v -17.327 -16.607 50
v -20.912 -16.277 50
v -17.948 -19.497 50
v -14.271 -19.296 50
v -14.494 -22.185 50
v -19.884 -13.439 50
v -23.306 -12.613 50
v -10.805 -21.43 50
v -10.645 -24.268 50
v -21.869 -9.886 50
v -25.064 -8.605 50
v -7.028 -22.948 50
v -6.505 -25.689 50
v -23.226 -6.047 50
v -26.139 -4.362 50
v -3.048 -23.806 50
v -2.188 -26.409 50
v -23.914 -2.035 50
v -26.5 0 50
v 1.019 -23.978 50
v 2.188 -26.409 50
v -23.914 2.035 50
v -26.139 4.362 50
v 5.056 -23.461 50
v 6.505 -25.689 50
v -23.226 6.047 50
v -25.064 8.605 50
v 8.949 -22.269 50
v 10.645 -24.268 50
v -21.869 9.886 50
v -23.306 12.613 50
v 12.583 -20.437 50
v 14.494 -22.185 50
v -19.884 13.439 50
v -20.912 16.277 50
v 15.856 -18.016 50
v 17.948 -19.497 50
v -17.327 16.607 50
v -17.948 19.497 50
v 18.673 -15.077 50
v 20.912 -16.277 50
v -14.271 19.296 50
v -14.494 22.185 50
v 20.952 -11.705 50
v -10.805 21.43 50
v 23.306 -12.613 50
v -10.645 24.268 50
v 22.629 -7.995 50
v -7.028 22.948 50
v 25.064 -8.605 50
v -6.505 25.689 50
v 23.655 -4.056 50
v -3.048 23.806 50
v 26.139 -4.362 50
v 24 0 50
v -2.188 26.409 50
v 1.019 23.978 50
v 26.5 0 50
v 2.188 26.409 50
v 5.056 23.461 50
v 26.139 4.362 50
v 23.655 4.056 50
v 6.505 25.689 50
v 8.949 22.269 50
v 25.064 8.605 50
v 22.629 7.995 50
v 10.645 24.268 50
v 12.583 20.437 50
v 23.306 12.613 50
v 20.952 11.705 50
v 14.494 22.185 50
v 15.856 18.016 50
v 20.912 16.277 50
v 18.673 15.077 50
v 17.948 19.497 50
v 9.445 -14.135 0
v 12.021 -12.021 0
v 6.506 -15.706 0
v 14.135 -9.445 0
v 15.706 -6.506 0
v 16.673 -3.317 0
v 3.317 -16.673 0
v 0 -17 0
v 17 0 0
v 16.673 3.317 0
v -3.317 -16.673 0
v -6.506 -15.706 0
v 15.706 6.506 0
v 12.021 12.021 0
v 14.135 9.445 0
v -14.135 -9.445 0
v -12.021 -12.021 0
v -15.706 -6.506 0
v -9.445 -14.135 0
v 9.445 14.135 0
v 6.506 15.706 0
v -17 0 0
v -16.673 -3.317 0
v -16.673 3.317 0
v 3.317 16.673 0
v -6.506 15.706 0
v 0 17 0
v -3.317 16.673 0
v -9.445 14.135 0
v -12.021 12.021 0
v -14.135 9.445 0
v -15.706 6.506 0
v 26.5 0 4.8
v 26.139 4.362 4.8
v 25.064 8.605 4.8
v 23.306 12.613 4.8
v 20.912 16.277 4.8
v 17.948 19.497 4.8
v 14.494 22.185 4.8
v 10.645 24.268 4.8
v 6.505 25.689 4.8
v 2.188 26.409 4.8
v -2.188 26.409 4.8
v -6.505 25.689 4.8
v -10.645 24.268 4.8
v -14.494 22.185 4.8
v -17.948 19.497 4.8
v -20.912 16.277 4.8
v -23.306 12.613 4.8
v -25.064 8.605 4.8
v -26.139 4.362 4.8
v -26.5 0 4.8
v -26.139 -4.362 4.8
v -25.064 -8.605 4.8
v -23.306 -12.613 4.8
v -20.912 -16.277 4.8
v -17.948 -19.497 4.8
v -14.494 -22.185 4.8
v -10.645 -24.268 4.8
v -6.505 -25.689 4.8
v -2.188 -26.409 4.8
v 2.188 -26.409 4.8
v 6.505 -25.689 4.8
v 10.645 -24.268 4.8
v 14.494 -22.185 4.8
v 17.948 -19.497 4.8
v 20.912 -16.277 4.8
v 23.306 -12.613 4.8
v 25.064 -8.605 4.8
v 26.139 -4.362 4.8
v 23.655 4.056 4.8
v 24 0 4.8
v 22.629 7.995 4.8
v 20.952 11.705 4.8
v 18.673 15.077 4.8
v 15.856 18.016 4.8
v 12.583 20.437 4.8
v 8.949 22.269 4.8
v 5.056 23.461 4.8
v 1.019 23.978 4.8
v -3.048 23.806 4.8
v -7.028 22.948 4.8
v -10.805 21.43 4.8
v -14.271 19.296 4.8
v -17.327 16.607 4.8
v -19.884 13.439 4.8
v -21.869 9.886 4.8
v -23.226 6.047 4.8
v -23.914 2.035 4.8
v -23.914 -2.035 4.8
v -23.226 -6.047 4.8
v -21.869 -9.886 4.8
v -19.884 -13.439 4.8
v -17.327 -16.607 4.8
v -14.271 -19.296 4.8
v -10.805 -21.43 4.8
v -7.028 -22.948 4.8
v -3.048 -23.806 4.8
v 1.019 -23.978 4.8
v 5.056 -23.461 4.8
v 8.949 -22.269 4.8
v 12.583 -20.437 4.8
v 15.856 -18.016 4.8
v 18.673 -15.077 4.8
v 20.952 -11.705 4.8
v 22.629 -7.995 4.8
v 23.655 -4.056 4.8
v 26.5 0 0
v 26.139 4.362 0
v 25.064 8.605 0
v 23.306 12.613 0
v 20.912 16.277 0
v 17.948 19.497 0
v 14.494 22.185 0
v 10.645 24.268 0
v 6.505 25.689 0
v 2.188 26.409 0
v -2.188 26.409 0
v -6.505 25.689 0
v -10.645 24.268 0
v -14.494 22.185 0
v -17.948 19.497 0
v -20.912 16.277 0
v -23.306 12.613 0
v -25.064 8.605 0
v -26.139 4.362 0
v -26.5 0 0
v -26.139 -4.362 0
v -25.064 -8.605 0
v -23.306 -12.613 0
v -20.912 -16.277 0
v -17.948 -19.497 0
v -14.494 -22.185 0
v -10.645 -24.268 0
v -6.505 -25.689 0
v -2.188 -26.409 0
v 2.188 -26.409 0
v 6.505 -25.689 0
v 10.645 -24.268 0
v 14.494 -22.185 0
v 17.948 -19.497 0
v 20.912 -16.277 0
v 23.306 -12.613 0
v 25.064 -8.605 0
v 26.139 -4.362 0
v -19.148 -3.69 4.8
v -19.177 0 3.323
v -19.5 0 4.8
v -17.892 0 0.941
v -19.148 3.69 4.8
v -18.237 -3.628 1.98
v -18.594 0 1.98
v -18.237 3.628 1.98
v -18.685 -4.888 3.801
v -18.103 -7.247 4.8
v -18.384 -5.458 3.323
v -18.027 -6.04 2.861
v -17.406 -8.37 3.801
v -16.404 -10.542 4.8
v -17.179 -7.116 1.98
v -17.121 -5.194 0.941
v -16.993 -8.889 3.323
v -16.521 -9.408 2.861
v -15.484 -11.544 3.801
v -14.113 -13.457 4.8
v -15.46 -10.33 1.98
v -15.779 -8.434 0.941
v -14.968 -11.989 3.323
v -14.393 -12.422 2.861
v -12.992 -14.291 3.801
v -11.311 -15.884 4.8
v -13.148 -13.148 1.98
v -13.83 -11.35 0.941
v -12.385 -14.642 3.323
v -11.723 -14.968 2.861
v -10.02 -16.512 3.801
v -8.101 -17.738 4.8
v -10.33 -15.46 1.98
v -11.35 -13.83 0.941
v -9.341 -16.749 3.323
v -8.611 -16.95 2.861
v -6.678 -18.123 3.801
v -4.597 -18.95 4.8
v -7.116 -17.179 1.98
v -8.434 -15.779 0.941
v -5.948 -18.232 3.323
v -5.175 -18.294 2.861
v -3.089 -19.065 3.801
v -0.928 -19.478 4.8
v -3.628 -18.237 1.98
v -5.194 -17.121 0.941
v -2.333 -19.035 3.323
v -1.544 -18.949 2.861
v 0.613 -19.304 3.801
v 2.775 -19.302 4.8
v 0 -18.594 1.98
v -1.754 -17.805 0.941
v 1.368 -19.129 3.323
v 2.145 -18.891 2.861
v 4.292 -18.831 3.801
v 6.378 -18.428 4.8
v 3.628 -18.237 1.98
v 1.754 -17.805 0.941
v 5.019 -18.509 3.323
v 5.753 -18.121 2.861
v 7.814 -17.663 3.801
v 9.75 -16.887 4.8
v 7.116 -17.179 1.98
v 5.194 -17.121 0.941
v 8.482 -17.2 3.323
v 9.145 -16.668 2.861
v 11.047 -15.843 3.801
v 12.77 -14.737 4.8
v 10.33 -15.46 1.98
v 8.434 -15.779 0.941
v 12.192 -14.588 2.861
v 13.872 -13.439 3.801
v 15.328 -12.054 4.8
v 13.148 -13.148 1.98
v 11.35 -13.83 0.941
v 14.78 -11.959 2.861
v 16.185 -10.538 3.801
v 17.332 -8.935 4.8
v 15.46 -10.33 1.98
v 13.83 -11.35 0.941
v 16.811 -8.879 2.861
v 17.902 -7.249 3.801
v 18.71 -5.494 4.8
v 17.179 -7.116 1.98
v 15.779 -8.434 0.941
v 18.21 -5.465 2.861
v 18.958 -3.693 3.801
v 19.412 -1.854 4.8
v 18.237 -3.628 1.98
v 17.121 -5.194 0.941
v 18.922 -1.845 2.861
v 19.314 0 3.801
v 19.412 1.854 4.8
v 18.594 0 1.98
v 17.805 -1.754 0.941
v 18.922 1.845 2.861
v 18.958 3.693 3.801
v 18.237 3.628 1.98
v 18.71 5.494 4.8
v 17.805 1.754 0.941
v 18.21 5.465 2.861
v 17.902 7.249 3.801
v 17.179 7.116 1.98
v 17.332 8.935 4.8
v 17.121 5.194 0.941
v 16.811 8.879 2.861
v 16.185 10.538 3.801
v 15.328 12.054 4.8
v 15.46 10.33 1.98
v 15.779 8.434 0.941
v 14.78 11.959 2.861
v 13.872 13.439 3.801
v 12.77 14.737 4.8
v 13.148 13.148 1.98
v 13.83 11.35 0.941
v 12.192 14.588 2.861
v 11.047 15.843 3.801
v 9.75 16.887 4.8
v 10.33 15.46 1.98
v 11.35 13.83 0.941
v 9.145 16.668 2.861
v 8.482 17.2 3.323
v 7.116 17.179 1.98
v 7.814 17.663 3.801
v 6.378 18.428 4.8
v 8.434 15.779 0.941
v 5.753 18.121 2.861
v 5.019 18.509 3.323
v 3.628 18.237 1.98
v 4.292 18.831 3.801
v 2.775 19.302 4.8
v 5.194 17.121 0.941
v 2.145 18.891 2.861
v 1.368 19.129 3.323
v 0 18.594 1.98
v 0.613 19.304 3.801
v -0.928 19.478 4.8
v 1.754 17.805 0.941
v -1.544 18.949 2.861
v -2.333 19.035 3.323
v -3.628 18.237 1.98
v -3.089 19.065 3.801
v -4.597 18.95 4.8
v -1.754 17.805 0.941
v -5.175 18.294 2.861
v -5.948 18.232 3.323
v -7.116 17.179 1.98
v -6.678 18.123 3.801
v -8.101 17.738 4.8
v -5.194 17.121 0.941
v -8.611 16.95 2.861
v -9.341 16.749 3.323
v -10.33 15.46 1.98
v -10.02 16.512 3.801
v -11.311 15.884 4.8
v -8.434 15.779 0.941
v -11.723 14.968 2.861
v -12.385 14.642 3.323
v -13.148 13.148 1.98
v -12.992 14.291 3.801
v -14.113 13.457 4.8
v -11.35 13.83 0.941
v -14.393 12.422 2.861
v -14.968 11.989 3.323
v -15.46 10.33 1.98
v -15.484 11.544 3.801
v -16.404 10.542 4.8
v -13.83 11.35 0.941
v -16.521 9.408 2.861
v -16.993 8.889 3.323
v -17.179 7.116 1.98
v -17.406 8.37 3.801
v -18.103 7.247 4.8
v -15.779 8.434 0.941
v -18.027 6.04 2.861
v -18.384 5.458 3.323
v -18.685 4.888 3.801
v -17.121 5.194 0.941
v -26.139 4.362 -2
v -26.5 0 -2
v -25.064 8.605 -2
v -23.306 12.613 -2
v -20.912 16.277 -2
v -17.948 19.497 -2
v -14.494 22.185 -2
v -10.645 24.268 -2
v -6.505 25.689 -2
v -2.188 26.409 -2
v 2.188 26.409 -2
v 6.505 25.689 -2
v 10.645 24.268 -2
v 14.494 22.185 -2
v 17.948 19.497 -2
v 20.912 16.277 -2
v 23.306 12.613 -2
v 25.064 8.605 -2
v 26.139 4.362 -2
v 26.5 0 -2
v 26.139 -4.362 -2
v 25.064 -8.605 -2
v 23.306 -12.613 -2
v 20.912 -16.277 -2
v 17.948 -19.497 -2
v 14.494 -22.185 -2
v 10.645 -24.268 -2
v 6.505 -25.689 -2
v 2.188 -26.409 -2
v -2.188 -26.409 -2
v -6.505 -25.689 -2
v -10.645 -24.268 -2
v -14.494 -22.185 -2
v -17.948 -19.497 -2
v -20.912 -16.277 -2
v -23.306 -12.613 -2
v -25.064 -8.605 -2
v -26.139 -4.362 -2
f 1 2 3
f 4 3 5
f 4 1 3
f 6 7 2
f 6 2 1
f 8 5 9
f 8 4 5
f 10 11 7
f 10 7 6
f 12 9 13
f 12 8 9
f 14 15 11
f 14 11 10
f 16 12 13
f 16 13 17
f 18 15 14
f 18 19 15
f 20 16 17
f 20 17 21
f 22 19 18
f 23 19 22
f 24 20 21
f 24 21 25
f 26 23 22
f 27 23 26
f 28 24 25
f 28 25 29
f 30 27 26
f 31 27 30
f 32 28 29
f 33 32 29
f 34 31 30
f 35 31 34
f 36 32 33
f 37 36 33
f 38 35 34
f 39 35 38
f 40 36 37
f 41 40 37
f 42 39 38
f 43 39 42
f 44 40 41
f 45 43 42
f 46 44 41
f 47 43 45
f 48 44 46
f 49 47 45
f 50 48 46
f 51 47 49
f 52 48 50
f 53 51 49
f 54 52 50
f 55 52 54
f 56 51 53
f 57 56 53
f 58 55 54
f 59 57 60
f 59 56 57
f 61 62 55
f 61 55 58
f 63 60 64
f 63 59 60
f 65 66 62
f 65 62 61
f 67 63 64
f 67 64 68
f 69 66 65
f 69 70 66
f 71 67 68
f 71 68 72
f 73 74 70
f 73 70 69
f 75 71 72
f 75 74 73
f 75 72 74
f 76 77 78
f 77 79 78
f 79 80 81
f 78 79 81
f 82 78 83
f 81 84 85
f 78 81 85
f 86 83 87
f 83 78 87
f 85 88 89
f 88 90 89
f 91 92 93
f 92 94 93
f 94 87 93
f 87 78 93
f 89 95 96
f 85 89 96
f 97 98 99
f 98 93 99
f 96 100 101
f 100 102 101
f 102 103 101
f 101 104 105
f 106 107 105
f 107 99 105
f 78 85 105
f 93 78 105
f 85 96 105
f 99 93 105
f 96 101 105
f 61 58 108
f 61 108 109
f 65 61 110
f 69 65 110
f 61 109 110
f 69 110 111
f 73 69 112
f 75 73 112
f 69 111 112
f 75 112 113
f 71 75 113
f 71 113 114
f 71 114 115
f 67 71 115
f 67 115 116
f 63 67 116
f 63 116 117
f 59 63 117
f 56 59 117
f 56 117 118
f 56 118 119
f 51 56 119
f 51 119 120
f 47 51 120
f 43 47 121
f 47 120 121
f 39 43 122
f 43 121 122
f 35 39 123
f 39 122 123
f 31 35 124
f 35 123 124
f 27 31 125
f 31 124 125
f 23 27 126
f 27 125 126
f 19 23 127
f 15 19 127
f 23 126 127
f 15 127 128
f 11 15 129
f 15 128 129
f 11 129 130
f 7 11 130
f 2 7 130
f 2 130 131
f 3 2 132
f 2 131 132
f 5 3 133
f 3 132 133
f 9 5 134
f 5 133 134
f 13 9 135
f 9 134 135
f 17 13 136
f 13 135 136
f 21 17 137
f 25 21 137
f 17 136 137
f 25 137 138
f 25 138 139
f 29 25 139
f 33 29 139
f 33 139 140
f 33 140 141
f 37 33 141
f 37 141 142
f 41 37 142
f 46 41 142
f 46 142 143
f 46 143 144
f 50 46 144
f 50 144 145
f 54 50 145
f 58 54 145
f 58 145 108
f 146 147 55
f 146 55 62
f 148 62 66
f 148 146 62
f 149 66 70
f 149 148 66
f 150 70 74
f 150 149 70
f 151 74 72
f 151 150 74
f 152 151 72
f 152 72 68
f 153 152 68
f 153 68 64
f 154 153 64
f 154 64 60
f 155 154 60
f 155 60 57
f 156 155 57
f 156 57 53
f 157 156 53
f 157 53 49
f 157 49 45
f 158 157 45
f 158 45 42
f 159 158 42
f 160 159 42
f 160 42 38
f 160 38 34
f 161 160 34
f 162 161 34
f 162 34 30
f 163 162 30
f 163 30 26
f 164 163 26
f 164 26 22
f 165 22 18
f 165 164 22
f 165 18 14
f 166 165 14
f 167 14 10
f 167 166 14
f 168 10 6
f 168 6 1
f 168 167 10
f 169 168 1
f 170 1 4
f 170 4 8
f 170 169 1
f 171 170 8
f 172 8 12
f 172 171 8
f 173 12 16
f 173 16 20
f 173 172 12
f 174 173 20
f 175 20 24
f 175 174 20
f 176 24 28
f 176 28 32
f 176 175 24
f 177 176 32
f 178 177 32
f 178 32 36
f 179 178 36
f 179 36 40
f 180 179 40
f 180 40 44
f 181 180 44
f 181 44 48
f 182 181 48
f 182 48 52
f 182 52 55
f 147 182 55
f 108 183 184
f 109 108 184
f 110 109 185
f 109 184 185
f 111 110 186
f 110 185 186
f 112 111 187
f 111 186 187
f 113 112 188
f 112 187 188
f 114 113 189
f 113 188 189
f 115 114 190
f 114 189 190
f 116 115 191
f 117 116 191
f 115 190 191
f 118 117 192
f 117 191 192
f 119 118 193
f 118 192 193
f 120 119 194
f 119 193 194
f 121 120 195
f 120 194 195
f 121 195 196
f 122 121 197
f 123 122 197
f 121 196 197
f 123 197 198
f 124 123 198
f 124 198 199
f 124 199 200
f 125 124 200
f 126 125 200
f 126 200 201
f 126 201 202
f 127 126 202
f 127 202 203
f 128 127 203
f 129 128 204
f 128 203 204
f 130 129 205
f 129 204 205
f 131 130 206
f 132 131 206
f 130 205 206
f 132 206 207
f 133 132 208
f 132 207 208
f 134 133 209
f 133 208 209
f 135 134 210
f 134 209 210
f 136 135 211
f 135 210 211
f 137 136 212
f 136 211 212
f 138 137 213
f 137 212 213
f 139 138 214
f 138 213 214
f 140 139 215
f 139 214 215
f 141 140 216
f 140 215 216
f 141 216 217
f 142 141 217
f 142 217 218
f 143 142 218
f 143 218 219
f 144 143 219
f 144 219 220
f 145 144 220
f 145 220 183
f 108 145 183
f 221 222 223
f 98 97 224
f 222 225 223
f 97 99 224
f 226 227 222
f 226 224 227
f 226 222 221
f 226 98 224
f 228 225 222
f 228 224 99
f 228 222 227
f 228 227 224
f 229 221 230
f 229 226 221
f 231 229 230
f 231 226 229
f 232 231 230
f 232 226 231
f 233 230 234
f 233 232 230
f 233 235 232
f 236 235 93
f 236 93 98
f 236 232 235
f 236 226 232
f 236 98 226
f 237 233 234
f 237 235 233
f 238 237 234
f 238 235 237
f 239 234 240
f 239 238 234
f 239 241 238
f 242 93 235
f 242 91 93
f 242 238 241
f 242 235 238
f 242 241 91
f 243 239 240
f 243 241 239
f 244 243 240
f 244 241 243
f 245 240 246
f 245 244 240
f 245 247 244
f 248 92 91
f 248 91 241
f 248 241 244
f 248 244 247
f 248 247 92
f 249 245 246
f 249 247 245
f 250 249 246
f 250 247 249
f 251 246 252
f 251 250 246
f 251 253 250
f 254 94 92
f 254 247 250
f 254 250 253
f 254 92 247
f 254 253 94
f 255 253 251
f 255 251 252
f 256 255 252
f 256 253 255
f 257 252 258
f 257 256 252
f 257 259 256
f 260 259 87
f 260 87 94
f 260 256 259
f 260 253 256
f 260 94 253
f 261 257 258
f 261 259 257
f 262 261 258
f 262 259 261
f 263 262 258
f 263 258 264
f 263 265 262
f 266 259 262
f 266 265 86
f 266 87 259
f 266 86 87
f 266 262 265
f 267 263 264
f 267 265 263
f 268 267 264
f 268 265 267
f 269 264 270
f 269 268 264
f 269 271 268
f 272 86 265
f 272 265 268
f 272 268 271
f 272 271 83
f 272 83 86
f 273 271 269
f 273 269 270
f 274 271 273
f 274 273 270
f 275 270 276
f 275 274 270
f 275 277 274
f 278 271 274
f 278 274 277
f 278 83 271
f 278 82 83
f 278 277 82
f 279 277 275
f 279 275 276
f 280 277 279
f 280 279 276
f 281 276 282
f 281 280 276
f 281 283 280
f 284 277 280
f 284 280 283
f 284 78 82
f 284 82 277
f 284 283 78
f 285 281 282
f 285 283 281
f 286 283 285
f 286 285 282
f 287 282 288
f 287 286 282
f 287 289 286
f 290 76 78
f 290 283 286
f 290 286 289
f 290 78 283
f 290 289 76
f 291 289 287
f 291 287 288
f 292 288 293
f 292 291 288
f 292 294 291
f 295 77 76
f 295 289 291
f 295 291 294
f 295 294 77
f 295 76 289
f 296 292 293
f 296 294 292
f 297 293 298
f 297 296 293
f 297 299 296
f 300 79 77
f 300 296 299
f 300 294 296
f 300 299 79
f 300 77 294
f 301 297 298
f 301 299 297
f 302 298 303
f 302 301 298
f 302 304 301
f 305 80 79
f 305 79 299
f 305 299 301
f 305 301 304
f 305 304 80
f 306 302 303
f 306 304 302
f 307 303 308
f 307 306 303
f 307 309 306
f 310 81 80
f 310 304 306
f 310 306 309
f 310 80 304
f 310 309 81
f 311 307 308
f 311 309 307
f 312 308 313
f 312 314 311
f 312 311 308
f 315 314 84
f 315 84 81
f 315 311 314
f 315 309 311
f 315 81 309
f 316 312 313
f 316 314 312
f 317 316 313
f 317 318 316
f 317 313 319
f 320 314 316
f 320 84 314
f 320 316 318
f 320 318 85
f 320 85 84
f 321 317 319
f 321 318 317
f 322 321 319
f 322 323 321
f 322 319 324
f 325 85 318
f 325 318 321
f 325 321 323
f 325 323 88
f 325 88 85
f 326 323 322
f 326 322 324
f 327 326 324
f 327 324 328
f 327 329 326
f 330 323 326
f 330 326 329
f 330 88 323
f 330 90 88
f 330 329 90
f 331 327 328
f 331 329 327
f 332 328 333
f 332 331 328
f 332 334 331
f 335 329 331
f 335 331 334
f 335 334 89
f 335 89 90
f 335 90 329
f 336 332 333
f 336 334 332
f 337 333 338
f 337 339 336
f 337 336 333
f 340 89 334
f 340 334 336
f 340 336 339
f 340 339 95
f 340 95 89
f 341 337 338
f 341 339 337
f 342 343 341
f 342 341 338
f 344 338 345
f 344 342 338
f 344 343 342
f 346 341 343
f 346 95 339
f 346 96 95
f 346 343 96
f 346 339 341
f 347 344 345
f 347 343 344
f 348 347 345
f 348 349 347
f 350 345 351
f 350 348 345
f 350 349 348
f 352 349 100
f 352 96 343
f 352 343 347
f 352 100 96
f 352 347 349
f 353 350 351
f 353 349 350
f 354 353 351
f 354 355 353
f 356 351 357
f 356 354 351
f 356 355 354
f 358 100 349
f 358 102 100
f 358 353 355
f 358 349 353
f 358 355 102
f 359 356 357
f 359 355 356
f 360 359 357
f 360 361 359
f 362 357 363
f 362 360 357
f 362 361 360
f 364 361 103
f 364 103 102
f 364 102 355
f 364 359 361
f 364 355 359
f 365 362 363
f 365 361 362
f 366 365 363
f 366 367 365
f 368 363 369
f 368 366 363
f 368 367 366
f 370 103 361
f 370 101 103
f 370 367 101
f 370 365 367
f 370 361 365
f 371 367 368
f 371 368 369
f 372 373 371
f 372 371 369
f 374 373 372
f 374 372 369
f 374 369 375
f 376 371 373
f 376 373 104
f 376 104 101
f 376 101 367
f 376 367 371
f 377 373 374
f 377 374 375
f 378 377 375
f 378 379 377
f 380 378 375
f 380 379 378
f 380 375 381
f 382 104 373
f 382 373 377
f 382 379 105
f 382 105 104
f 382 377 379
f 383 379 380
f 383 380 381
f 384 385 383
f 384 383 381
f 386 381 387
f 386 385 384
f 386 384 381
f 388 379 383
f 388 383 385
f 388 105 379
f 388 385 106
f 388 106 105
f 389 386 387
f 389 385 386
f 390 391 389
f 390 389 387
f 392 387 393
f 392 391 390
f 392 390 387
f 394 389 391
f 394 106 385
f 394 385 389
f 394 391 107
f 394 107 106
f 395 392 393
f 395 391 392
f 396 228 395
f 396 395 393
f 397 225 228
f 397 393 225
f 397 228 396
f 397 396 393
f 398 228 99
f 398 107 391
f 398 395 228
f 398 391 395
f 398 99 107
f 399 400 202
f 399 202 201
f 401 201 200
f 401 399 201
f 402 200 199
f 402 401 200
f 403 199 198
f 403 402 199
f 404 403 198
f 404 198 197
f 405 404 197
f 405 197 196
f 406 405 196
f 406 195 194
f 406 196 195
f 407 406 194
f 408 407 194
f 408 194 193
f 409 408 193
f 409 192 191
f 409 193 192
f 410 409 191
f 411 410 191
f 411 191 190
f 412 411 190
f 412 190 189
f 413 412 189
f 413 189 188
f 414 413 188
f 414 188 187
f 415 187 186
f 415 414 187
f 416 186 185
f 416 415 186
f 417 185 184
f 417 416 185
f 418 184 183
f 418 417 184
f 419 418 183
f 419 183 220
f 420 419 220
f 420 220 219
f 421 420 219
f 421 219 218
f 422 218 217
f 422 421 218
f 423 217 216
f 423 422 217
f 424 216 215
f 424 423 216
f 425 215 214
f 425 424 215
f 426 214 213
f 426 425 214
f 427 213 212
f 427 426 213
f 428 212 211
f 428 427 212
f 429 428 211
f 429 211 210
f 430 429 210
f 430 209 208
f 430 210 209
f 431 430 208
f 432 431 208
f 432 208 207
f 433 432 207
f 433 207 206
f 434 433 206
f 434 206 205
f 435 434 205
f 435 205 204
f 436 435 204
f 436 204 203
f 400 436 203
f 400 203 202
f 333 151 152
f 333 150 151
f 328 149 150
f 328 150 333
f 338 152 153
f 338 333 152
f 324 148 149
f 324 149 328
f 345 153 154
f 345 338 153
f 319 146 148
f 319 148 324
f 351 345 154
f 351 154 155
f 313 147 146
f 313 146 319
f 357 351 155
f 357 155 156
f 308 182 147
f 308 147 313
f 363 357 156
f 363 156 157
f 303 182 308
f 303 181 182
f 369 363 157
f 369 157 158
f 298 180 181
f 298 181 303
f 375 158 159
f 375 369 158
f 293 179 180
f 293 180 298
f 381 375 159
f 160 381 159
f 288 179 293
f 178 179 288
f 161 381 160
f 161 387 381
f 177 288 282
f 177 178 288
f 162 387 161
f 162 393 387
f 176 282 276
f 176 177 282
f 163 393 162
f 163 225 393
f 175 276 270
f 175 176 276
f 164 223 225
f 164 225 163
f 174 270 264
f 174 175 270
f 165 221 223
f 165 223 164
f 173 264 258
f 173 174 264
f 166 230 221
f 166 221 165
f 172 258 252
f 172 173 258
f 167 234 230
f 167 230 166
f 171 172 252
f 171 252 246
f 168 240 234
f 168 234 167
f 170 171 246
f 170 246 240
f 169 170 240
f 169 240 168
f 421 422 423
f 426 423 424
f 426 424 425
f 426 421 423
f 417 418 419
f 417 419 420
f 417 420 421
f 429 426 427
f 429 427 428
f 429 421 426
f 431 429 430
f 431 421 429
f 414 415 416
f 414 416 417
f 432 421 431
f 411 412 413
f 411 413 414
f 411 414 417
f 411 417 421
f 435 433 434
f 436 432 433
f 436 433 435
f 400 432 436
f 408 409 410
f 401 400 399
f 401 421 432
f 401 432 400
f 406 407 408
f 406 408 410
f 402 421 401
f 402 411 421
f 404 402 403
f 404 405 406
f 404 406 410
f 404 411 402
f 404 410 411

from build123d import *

# Parameters (mm, degrees)
SKETCH1_R           = 26.5
SKETCH1_R_2         = 24
BOSS_EXTRUDE1_DEPTH = 50
BOSS_EXTRUDE2_START = 2
SKETCH2_R           = 26.5
BOSS_EXTRUDE2_DEPTH = 2


with BuildPart() as part:
    # Sketch1 → Boss-Extrude1 (new body)
    with BuildSketch(Plane(origin=(0, 0, 0), x_dir=(0, 1, 0), z_dir=(0, 0, 1))):
        Circle(SKETCH1_R)
        Circle(SKETCH1_R_2, mode=Mode.SUBTRACT)
    extrude(amount=BOSS_EXTRUDE1_DEPTH)

    # Sketch2 → Boss-Extrude2 (add)
    with BuildSketch(Plane(origin=(0, 0, 0), x_dir=(1, 0, 0), z_dir=(0, 0, -1)).offset(BOSS_EXTRUDE2_START)):
        Circle(SKETCH2_R)
    extrude(amount=-BOSS_EXTRUDE2_DEPTH)

    # Sketch5 → Revolve1 (revolve)
    with BuildSketch(Plane.YZ):
        with BuildLine():
            Line((-26.5, 0), (-26.5, 4.8))
            Line((-26.5, 4.8), (-19.5, 4.8))
            add(Edge.make_bspline(
                [(-19.5, 4.8), (-19.143895577, 1.941095467), (-17, 0)],
                knots=[0, 0, 0, 1, 1, 1], degree=2))
            Line((-17, 0), (-26.5, 0))
        make_face()
    revolve(axis=Axis((0, 0, 0), (0, 0, 1)))


solid = part.part
